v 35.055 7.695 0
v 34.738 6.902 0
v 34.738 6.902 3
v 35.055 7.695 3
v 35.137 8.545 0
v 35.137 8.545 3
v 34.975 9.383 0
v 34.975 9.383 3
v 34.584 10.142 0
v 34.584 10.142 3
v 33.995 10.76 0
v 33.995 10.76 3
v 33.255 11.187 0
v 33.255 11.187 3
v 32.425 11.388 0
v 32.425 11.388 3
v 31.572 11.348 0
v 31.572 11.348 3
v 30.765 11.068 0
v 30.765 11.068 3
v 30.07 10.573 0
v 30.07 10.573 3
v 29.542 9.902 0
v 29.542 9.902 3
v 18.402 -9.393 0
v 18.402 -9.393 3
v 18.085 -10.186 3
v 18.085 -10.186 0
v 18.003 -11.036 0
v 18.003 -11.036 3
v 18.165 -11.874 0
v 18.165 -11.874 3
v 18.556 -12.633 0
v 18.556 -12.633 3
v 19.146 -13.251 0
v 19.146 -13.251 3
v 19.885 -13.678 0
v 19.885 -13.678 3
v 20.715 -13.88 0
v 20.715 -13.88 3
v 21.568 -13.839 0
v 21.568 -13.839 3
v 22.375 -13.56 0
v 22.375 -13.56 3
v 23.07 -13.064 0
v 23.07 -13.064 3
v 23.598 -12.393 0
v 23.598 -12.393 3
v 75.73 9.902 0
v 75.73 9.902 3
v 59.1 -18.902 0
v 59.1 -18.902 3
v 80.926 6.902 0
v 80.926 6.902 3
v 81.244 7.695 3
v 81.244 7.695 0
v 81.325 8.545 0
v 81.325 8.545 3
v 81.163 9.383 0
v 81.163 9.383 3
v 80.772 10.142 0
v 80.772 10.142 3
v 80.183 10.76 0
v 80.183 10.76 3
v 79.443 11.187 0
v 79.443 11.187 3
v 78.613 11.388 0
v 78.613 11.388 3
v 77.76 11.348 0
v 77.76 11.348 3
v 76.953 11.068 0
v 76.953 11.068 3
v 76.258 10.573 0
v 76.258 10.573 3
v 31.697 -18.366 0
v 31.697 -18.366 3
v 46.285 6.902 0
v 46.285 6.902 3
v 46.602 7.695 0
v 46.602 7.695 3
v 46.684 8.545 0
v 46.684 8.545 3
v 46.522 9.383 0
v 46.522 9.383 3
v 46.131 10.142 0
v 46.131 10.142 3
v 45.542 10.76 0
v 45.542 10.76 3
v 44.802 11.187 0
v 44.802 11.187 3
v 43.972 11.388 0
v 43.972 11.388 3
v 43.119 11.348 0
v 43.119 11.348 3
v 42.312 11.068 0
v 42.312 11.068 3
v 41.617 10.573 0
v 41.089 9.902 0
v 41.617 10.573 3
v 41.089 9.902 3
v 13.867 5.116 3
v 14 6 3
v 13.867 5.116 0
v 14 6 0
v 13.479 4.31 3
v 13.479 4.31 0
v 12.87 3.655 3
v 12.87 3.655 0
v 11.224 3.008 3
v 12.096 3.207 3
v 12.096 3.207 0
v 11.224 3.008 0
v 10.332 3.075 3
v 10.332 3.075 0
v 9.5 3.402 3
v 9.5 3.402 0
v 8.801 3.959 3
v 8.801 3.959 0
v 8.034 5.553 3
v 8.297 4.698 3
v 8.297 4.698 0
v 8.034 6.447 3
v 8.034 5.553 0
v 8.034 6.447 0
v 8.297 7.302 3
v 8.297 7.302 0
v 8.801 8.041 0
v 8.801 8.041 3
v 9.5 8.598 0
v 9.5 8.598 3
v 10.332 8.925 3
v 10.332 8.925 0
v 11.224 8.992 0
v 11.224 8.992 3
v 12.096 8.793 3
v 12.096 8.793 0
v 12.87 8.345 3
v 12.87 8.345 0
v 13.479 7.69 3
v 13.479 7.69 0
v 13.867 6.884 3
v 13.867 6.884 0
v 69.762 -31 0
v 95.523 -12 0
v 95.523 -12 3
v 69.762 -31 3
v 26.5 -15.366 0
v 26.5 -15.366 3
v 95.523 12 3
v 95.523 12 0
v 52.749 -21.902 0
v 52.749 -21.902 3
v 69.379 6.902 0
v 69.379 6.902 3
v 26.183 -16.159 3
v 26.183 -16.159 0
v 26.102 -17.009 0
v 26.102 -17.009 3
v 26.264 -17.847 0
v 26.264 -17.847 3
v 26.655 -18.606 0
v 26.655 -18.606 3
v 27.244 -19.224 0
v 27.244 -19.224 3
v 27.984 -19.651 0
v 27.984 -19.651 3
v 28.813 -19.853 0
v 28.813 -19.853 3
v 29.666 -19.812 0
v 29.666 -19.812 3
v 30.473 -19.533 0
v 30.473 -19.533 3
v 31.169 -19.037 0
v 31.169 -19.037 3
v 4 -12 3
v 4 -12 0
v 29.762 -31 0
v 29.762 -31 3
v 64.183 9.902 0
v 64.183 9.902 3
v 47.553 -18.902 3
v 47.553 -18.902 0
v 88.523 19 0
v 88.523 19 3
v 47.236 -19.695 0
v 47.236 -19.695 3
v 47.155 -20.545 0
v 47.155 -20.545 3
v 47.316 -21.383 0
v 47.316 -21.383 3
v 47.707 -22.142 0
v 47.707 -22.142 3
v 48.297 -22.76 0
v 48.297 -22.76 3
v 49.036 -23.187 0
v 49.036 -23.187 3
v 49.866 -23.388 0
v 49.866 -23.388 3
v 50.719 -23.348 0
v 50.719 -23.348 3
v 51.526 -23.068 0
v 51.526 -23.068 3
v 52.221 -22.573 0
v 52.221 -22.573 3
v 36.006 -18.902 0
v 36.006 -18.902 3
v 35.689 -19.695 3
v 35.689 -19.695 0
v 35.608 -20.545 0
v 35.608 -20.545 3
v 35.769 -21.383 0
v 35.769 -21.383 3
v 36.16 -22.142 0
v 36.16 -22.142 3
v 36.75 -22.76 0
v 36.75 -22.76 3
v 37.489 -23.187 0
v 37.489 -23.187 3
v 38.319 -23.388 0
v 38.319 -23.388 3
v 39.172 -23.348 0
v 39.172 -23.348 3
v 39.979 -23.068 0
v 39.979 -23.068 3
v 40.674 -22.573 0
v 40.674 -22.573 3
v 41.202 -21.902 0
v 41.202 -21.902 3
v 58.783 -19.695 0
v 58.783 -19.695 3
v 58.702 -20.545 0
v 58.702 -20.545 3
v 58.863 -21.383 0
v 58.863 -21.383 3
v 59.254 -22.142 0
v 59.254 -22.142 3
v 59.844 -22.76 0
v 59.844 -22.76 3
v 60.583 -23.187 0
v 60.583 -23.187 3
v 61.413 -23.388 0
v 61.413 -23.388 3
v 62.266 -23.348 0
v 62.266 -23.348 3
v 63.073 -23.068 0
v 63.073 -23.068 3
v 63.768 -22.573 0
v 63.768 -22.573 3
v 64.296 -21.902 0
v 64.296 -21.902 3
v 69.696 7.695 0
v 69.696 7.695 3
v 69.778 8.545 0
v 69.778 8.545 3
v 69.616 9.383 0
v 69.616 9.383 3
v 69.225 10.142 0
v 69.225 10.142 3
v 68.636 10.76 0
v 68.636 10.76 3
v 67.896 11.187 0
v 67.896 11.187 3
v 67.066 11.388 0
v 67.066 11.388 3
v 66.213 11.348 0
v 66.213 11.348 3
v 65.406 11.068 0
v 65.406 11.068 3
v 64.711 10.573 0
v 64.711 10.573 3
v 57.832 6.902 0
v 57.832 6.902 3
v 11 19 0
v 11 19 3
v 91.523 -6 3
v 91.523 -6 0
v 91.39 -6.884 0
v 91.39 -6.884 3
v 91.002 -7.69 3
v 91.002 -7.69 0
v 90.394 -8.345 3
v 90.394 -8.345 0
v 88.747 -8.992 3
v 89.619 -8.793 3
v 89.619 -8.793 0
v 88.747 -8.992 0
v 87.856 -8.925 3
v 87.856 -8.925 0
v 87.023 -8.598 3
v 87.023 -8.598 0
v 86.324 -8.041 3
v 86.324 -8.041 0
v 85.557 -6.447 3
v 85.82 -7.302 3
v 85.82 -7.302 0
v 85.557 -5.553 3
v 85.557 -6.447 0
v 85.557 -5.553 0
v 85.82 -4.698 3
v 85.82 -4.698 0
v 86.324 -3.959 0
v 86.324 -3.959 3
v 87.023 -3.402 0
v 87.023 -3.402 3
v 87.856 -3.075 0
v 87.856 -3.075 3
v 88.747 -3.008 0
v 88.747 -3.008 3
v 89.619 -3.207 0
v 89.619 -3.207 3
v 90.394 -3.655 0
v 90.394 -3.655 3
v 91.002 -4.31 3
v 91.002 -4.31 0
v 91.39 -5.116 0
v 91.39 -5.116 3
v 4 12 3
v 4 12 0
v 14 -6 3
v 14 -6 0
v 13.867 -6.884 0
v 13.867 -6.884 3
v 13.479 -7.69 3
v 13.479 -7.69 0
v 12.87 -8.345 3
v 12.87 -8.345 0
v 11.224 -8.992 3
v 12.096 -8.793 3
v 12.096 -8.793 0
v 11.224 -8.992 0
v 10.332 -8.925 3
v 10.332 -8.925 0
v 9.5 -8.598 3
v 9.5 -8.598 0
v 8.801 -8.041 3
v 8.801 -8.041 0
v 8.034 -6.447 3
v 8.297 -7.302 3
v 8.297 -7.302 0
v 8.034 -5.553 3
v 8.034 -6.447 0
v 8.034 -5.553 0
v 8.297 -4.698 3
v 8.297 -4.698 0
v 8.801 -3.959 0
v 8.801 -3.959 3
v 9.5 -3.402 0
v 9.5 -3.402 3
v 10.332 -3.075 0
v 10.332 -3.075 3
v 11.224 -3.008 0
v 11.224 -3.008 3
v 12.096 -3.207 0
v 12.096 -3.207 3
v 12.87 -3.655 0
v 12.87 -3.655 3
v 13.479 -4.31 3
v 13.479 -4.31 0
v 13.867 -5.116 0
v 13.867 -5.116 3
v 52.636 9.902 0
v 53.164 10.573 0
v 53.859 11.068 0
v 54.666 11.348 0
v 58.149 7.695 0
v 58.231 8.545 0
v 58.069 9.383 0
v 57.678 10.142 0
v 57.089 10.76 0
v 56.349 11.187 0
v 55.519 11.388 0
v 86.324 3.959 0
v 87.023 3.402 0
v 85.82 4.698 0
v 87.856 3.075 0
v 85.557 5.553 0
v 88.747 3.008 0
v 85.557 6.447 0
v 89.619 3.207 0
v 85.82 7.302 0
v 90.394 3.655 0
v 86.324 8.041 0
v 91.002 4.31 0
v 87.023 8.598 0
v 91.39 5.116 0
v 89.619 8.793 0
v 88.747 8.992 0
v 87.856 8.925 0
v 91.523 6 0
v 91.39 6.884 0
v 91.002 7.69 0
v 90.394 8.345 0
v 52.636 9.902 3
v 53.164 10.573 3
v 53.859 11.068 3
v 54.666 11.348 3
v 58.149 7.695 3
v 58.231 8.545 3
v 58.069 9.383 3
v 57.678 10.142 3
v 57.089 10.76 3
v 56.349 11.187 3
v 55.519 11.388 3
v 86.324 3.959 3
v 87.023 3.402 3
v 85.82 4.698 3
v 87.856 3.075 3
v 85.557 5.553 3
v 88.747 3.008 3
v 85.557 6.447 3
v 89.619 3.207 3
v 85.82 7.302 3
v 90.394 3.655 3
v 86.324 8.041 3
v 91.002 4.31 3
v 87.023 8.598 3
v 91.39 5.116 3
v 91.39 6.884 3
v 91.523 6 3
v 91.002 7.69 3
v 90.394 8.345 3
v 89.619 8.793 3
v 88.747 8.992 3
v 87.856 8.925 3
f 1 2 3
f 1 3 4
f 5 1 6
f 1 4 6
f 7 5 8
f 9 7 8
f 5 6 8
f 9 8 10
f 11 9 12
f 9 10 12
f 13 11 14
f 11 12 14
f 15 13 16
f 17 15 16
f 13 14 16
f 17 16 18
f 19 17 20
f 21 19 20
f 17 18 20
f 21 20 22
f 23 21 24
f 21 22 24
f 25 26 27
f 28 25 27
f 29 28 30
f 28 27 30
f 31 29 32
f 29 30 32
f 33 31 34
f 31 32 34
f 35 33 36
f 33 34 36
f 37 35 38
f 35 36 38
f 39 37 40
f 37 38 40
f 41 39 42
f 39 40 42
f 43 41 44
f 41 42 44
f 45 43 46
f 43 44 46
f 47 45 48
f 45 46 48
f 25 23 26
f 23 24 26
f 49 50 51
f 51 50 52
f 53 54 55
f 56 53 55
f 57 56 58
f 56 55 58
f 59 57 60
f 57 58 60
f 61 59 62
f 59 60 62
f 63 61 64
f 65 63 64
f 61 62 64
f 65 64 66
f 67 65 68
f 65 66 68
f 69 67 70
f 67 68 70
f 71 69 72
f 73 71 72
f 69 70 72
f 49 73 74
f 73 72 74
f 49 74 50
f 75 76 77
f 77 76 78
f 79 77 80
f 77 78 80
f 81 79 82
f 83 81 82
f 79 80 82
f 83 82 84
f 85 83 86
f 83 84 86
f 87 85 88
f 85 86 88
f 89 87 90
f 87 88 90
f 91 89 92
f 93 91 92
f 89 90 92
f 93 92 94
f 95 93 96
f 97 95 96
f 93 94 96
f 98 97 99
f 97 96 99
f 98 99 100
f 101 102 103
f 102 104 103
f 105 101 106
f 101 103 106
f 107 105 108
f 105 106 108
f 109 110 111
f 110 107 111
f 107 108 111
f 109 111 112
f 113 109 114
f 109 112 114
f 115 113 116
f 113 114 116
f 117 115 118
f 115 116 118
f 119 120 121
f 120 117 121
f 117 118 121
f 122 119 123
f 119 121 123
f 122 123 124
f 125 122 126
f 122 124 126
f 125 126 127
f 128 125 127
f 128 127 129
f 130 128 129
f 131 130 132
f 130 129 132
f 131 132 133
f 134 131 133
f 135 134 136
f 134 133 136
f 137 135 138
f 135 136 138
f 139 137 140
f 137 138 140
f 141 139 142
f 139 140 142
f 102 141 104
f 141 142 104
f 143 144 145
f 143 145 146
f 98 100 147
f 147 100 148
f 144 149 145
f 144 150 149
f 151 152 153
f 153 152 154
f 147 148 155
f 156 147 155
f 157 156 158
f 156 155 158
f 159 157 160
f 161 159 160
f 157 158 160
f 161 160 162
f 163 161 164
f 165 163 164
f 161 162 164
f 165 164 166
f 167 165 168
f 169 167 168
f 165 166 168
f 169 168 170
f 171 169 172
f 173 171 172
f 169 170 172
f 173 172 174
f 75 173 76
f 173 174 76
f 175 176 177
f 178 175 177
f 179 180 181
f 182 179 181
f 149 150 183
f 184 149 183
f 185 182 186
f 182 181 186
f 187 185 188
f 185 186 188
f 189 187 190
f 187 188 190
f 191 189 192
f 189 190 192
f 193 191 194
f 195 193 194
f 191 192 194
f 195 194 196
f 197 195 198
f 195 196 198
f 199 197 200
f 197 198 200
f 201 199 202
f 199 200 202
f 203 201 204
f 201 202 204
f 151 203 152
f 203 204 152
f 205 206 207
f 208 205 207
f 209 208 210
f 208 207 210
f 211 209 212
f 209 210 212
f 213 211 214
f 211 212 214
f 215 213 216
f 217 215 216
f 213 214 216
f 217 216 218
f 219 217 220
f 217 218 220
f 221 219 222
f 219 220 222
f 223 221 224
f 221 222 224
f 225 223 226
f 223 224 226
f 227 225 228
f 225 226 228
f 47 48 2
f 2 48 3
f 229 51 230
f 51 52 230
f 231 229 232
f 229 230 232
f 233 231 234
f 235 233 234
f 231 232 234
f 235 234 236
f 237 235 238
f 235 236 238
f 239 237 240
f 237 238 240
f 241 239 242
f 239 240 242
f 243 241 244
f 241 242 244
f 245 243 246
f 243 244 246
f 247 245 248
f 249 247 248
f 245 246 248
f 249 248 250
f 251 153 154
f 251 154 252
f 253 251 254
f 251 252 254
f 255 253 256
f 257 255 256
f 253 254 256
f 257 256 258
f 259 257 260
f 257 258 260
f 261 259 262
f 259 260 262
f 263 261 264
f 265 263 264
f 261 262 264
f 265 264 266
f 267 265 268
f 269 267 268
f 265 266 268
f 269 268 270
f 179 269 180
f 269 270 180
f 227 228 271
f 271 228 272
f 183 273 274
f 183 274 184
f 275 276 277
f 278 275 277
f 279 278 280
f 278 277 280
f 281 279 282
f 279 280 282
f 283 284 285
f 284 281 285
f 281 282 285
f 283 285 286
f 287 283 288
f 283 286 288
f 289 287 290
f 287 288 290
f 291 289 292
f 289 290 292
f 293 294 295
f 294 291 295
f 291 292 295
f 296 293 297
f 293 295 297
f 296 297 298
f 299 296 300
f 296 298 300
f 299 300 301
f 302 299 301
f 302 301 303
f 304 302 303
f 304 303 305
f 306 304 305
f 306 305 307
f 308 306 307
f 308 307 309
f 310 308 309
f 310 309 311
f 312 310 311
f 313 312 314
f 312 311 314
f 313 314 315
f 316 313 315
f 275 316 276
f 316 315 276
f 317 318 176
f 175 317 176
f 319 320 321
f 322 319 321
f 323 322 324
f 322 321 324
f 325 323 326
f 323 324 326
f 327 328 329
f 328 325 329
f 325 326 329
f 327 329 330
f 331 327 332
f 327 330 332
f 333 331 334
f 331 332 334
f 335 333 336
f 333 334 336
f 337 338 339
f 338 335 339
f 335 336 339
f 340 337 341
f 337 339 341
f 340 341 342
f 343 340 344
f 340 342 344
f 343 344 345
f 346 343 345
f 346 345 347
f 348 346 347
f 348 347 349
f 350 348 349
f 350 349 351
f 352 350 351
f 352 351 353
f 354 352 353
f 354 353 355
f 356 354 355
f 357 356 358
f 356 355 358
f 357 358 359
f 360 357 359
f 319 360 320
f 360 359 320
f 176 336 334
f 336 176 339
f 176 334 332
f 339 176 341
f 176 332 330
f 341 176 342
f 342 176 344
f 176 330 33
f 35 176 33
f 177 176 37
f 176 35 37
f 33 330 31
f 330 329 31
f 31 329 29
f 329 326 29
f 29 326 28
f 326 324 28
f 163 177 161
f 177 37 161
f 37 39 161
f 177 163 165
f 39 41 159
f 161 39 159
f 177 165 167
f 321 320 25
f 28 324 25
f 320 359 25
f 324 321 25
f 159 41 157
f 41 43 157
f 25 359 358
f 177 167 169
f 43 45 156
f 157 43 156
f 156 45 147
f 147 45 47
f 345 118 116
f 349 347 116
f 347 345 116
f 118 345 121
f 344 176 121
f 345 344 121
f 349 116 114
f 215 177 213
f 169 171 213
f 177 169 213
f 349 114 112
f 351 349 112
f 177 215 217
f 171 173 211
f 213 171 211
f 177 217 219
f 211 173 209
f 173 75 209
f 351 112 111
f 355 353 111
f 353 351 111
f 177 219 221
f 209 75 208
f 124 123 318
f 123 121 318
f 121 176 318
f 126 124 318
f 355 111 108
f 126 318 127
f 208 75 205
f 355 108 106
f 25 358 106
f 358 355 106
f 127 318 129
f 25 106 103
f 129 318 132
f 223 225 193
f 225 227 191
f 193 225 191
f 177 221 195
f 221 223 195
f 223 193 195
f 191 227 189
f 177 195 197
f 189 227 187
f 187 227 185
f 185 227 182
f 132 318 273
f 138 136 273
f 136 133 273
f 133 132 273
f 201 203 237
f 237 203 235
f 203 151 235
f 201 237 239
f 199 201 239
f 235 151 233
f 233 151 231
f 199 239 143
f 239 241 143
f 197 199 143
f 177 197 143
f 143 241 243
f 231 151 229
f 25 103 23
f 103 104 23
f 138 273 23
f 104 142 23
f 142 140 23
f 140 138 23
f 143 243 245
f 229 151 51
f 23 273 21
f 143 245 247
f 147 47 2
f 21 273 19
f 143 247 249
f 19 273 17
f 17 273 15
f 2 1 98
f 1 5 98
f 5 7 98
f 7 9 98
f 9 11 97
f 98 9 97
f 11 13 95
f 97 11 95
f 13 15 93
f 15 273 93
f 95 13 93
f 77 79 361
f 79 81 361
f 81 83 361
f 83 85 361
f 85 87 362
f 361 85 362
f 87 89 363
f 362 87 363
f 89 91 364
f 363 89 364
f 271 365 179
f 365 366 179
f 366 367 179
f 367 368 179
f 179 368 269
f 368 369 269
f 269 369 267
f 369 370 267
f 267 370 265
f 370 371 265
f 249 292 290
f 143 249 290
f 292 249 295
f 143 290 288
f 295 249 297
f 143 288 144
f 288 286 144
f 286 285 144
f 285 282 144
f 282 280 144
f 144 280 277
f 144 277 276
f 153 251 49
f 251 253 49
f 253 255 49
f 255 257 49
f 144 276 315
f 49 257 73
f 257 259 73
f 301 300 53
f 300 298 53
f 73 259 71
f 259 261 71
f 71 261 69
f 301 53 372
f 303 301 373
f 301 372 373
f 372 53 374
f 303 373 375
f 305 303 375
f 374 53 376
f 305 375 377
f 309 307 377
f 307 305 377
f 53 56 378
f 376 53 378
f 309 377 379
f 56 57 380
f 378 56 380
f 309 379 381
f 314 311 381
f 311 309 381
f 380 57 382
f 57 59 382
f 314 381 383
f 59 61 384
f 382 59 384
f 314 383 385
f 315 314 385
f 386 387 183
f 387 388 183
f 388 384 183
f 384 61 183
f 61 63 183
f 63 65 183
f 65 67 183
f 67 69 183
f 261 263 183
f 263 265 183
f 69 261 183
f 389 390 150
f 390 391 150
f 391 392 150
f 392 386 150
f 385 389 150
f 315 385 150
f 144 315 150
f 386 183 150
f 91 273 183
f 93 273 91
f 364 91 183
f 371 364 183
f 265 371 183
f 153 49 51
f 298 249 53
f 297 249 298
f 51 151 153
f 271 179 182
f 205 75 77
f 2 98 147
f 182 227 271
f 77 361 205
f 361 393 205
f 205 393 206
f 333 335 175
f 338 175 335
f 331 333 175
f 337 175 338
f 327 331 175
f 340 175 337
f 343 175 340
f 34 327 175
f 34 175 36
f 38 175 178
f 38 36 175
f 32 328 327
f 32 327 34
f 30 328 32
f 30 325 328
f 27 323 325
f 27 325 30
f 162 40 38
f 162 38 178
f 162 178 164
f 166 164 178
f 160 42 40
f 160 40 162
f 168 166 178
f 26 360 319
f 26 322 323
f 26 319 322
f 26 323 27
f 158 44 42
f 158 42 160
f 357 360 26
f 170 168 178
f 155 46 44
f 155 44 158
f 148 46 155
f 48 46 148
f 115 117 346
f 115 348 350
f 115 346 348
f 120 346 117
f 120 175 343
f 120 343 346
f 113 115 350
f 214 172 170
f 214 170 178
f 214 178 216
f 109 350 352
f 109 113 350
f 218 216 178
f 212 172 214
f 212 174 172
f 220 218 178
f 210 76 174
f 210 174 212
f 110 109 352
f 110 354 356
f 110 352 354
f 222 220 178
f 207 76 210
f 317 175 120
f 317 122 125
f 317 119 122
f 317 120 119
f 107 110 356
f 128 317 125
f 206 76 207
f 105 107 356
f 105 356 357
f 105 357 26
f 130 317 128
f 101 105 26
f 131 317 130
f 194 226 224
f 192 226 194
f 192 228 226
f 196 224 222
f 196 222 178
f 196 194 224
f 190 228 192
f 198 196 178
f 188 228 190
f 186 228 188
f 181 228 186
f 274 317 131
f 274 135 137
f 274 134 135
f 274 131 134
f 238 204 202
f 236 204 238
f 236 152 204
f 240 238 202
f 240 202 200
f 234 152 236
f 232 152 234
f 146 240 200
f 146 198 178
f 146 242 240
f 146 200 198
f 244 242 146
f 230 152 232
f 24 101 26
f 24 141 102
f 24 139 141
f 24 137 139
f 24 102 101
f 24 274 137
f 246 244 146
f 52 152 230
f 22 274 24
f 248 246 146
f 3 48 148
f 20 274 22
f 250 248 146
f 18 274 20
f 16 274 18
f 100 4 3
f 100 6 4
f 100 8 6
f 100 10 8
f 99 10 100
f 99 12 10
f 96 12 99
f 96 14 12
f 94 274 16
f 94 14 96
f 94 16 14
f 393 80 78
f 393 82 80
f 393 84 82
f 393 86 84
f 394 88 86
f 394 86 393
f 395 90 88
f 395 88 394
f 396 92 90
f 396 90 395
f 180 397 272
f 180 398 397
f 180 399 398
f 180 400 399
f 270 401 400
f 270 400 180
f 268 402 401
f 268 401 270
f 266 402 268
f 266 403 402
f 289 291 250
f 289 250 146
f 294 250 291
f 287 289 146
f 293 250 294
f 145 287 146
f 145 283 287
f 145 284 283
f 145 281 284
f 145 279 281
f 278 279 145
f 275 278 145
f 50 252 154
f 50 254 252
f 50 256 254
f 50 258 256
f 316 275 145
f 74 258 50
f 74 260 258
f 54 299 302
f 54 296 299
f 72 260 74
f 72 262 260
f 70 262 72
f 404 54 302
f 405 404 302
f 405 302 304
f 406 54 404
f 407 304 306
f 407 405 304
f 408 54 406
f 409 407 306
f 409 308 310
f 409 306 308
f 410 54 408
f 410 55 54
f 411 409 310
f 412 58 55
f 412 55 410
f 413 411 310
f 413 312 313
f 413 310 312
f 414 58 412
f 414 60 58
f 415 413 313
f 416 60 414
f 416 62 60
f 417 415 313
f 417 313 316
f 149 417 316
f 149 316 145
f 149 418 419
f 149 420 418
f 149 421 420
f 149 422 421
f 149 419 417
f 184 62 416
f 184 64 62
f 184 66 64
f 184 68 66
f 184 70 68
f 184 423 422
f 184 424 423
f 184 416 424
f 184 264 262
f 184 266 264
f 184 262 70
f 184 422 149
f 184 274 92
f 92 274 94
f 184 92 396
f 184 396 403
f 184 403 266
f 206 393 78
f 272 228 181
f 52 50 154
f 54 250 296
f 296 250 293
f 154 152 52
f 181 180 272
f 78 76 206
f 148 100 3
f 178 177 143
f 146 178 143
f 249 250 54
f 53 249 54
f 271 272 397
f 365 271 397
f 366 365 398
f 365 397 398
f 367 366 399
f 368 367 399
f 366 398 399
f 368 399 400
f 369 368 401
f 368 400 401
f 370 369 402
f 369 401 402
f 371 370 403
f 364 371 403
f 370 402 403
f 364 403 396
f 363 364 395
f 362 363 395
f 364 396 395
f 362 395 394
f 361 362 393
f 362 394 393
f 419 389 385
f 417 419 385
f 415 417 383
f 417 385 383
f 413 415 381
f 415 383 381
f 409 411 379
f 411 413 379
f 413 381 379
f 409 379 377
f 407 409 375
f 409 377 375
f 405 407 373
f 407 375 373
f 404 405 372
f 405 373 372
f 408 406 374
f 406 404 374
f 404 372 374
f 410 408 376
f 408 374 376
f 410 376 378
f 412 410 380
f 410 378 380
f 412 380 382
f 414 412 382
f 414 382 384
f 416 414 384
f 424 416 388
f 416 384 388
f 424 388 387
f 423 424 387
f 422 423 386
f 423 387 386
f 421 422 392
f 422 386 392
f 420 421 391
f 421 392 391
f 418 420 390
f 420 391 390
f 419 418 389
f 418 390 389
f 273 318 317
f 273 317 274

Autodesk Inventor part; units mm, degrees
ref_plane "YZ Plane" through (0, 0, 0) normal (1, 0, 0) x (0, 1, 0)
ref_plane "XZ Plane" through (0, 0, 0) normal (0, 1, 0) x (-1, 0, 0)
ref_plane "XY Plane" through (0, 0, 0) normal (0, 0, 1) x (1, 0, 0)
sketch "Sketch1" plane through (0, 0, 0) normal (0, 0, 1) x (1, 0, 0)
  circle A0 centre (11, 6) radius 2.7 construction
  circle A1 centre (11, -6) radius 2.7 construction
  line L0 (49.7615, -342.4426) -> (49.7615, 314.6303) construction
  line L1 (11, 12) -> (-4.4335, 12) construction
  line L2 (-17, -12) -> (11, -12) construction
  line L3 (4, 12) -> (4, -12)
  line L4 (4, 12) -> (11, 19)
  line L5 (11, 19) -> (49.7615, 19)
  line L6 (19.0192, 2.5843) -> (28.2364, 13.6384) construction
  circle A2 centre (11, 6) radius 3
  circle A3 centre (11, -6) radius 3
  circle A4 centre (88.5231, 6) radius 3
  circle A5 centre (88.5231, -6) radius 3
  line L7 (4, -12) -> (29.7615, -31)
  line L8 (29.7615, -31) -> (49.7615, -31)
  line L9 (95.5231, 12) -> (95.5231, -12)
  line L10 (95.5231, 12) -> (88.5231, 19)
  line L11 (88.5231, 19) -> (49.7615, 19)
  line L12 (95.5231, -12) -> (69.7615, -31)
  line L13 (69.7615, -31) -> (49.7615, -31)
  point P0 (0, 0)
  dimension "d0" = 7
  dimension "d6" = 6
  dimension "d7" = 6
  dimension "d14" = 7
  dimension "d15" = 50
  dimension "d16" = 20
  dimension "d38" = 135
extrude "Plate1" add sketch "Sketch1" along normal blind 3
sketch "Sketch5" plane through (0, 0, 3) normal (0, 0, 1) x (1, 0, 0)
  circle A0 centre (88.5231, -6) radius 3 construction
  line L0 (4, -12) -> (4, 12) construction
  line L1 (29.7615, -31) -> (4, -12) construction
  line L2 (69.7615, -31) -> (29.7615, -31) construction
  line L3 (95.5231, -12) -> (69.7615, -31) construction
  line L4 (95.5231, 12) -> (95.5231, -12) construction
  line L5 (88.5231, 19) -> (95.5231, 12) construction
  line L6 (11, 19) -> (88.5231, 19) construction
  line L7 (4, 12) -> (11, 19) construction
  line L8 (85.2094, 11) -> (87.5231, 8.6863) construction
  line L9 (87.5231, 8.6863) -> (87.5231, -7.9598) construction
  line L10 (87.5231, -7.9598) -> (67.1305, -23) construction
  line L11 (67.1305, -23) -> (32.3926, -23) construction
  line L12 (32.3926, -23) -> (12, -7.9598) construction
  line L13 (12, -7.9598) -> (12, 8.6863) construction
  line L14 (12, 8.6863) -> (14.3137, 11) construction
  line L15 (14.3137, 11) -> (85.2094, 11) construction
  line L16 (18, 11) -> (18, -12.385) construction
  line L17 (49.7615, 11) -> (49.7615, -23) construction
  line L18 (81.5231, 11) -> (81.5231, -12.385) construction
  line L19 (33.6401, 11) -> (19.5, -13.4913) construction
  line L20 (29.542, 9.9019) -> (18.4019, -9.3932)
  line L21 (23.5981, -12.3932) -> (34.7381, 6.9019)
  arc A1 (34.7381, 6.9019) -> (29.542, 9.9019) centre (32.1401, 8.4019) ccw
  arc A2 (18.4019, -9.3932) -> (23.5981, -12.3932) centre (21, -10.8932) ccw
  line L22 (45.1871, 11) -> (27.5985, -19.4642) construction
  line L23 (41.089, 9.9019) -> (26.5005, -15.3662)
  line L24 (31.6966, -18.3662) -> (46.2851, 6.9019)
  arc A3 (46.2851, 6.9019) -> (41.089, 9.9019) centre (43.6871, 8.4019) ccw
  arc A4 (26.5005, -15.3662) -> (31.6966, -18.3662) centre (29.0985, -16.8662) ccw
  line L25 (56.7341, 11) -> (37.1042, -23) construction
  line L26 (52.636, 9.9019) -> (36.0061, -18.9019)
  line L27 (41.2022, -21.9019) -> (57.8321, 6.9019)
  arc A5 (57.8321, 6.9019) -> (52.636, 9.9019) centre (55.2341, 8.4019) ccw
  arc A6 (36.0061, -18.9019) -> (41.2022, -21.9019) centre (38.6042, -20.4019) ccw
  line L28 (68.2811, 11) -> (48.6512, -23) construction
  line L29 (64.183, 9.9019) -> (47.5531, -18.9019)
  line L30 (52.7492, -21.9019) -> (69.3791, 6.9019)
  arc A7 (69.3791, 6.9019) -> (64.183, 9.9019) centre (66.7811, 8.4019) ccw
  arc A8 (47.5531, -18.9019) -> (52.7492, -21.9019) centre (50.1512, -20.4019) ccw
  line L31 (79.8281, 11) -> (60.1982, -23) construction
  line L32 (75.73, 9.9019) -> (59.1001, -18.9019)
  line L33 (64.2962, -21.9019) -> (80.9262, 6.9019)
  arc A9 (80.9262, 6.9019) -> (75.73, 9.9019) centre (78.3281, 8.4019) ccw
  arc A10 (59.1001, -18.9019) -> (64.2962, -21.9019) centre (61.6982, -20.4019) ccw
  point P0 (26.57, -1.2456)
  point P1 (36.3928, -4.2321)
  point P2 (46.9191, -6)
  point P3 (58.4661, -6)
  point P4 (70.0131, -6)
  dimension "d61" = 8
  dimension "d62" = 14
  dimension "d63" = 3
  dimension "d64" = 60
  dimension "d65" = 4
  dimension "d66" = 4
  dimension "d67" = 4
  dimension "d68" = 4
extrude "Cut2" cut sketch "Sketch5" against normal blind 3
equation "\"d9\" = Thickness"
equation "\"BendRadius\" = Thickness"
equation "\"BendReliefWidth\" = Thickness"
equation "\"BendReliefDepth\" = 0.5 * Thickness"
equation "\"CornerReliefSize\" = 4 * Thickness"
equation "\"MinimumRemnant\" = 2 * Thickness"
equation "\"TransitionRadius\" = BendRadius"
equation "\"JacobiRadiusSize\" = BendRadius"
equation "\"GapSize\" = Thickness"
equation "\"Thickness\" = 3"
properties part number "NoseMount"
